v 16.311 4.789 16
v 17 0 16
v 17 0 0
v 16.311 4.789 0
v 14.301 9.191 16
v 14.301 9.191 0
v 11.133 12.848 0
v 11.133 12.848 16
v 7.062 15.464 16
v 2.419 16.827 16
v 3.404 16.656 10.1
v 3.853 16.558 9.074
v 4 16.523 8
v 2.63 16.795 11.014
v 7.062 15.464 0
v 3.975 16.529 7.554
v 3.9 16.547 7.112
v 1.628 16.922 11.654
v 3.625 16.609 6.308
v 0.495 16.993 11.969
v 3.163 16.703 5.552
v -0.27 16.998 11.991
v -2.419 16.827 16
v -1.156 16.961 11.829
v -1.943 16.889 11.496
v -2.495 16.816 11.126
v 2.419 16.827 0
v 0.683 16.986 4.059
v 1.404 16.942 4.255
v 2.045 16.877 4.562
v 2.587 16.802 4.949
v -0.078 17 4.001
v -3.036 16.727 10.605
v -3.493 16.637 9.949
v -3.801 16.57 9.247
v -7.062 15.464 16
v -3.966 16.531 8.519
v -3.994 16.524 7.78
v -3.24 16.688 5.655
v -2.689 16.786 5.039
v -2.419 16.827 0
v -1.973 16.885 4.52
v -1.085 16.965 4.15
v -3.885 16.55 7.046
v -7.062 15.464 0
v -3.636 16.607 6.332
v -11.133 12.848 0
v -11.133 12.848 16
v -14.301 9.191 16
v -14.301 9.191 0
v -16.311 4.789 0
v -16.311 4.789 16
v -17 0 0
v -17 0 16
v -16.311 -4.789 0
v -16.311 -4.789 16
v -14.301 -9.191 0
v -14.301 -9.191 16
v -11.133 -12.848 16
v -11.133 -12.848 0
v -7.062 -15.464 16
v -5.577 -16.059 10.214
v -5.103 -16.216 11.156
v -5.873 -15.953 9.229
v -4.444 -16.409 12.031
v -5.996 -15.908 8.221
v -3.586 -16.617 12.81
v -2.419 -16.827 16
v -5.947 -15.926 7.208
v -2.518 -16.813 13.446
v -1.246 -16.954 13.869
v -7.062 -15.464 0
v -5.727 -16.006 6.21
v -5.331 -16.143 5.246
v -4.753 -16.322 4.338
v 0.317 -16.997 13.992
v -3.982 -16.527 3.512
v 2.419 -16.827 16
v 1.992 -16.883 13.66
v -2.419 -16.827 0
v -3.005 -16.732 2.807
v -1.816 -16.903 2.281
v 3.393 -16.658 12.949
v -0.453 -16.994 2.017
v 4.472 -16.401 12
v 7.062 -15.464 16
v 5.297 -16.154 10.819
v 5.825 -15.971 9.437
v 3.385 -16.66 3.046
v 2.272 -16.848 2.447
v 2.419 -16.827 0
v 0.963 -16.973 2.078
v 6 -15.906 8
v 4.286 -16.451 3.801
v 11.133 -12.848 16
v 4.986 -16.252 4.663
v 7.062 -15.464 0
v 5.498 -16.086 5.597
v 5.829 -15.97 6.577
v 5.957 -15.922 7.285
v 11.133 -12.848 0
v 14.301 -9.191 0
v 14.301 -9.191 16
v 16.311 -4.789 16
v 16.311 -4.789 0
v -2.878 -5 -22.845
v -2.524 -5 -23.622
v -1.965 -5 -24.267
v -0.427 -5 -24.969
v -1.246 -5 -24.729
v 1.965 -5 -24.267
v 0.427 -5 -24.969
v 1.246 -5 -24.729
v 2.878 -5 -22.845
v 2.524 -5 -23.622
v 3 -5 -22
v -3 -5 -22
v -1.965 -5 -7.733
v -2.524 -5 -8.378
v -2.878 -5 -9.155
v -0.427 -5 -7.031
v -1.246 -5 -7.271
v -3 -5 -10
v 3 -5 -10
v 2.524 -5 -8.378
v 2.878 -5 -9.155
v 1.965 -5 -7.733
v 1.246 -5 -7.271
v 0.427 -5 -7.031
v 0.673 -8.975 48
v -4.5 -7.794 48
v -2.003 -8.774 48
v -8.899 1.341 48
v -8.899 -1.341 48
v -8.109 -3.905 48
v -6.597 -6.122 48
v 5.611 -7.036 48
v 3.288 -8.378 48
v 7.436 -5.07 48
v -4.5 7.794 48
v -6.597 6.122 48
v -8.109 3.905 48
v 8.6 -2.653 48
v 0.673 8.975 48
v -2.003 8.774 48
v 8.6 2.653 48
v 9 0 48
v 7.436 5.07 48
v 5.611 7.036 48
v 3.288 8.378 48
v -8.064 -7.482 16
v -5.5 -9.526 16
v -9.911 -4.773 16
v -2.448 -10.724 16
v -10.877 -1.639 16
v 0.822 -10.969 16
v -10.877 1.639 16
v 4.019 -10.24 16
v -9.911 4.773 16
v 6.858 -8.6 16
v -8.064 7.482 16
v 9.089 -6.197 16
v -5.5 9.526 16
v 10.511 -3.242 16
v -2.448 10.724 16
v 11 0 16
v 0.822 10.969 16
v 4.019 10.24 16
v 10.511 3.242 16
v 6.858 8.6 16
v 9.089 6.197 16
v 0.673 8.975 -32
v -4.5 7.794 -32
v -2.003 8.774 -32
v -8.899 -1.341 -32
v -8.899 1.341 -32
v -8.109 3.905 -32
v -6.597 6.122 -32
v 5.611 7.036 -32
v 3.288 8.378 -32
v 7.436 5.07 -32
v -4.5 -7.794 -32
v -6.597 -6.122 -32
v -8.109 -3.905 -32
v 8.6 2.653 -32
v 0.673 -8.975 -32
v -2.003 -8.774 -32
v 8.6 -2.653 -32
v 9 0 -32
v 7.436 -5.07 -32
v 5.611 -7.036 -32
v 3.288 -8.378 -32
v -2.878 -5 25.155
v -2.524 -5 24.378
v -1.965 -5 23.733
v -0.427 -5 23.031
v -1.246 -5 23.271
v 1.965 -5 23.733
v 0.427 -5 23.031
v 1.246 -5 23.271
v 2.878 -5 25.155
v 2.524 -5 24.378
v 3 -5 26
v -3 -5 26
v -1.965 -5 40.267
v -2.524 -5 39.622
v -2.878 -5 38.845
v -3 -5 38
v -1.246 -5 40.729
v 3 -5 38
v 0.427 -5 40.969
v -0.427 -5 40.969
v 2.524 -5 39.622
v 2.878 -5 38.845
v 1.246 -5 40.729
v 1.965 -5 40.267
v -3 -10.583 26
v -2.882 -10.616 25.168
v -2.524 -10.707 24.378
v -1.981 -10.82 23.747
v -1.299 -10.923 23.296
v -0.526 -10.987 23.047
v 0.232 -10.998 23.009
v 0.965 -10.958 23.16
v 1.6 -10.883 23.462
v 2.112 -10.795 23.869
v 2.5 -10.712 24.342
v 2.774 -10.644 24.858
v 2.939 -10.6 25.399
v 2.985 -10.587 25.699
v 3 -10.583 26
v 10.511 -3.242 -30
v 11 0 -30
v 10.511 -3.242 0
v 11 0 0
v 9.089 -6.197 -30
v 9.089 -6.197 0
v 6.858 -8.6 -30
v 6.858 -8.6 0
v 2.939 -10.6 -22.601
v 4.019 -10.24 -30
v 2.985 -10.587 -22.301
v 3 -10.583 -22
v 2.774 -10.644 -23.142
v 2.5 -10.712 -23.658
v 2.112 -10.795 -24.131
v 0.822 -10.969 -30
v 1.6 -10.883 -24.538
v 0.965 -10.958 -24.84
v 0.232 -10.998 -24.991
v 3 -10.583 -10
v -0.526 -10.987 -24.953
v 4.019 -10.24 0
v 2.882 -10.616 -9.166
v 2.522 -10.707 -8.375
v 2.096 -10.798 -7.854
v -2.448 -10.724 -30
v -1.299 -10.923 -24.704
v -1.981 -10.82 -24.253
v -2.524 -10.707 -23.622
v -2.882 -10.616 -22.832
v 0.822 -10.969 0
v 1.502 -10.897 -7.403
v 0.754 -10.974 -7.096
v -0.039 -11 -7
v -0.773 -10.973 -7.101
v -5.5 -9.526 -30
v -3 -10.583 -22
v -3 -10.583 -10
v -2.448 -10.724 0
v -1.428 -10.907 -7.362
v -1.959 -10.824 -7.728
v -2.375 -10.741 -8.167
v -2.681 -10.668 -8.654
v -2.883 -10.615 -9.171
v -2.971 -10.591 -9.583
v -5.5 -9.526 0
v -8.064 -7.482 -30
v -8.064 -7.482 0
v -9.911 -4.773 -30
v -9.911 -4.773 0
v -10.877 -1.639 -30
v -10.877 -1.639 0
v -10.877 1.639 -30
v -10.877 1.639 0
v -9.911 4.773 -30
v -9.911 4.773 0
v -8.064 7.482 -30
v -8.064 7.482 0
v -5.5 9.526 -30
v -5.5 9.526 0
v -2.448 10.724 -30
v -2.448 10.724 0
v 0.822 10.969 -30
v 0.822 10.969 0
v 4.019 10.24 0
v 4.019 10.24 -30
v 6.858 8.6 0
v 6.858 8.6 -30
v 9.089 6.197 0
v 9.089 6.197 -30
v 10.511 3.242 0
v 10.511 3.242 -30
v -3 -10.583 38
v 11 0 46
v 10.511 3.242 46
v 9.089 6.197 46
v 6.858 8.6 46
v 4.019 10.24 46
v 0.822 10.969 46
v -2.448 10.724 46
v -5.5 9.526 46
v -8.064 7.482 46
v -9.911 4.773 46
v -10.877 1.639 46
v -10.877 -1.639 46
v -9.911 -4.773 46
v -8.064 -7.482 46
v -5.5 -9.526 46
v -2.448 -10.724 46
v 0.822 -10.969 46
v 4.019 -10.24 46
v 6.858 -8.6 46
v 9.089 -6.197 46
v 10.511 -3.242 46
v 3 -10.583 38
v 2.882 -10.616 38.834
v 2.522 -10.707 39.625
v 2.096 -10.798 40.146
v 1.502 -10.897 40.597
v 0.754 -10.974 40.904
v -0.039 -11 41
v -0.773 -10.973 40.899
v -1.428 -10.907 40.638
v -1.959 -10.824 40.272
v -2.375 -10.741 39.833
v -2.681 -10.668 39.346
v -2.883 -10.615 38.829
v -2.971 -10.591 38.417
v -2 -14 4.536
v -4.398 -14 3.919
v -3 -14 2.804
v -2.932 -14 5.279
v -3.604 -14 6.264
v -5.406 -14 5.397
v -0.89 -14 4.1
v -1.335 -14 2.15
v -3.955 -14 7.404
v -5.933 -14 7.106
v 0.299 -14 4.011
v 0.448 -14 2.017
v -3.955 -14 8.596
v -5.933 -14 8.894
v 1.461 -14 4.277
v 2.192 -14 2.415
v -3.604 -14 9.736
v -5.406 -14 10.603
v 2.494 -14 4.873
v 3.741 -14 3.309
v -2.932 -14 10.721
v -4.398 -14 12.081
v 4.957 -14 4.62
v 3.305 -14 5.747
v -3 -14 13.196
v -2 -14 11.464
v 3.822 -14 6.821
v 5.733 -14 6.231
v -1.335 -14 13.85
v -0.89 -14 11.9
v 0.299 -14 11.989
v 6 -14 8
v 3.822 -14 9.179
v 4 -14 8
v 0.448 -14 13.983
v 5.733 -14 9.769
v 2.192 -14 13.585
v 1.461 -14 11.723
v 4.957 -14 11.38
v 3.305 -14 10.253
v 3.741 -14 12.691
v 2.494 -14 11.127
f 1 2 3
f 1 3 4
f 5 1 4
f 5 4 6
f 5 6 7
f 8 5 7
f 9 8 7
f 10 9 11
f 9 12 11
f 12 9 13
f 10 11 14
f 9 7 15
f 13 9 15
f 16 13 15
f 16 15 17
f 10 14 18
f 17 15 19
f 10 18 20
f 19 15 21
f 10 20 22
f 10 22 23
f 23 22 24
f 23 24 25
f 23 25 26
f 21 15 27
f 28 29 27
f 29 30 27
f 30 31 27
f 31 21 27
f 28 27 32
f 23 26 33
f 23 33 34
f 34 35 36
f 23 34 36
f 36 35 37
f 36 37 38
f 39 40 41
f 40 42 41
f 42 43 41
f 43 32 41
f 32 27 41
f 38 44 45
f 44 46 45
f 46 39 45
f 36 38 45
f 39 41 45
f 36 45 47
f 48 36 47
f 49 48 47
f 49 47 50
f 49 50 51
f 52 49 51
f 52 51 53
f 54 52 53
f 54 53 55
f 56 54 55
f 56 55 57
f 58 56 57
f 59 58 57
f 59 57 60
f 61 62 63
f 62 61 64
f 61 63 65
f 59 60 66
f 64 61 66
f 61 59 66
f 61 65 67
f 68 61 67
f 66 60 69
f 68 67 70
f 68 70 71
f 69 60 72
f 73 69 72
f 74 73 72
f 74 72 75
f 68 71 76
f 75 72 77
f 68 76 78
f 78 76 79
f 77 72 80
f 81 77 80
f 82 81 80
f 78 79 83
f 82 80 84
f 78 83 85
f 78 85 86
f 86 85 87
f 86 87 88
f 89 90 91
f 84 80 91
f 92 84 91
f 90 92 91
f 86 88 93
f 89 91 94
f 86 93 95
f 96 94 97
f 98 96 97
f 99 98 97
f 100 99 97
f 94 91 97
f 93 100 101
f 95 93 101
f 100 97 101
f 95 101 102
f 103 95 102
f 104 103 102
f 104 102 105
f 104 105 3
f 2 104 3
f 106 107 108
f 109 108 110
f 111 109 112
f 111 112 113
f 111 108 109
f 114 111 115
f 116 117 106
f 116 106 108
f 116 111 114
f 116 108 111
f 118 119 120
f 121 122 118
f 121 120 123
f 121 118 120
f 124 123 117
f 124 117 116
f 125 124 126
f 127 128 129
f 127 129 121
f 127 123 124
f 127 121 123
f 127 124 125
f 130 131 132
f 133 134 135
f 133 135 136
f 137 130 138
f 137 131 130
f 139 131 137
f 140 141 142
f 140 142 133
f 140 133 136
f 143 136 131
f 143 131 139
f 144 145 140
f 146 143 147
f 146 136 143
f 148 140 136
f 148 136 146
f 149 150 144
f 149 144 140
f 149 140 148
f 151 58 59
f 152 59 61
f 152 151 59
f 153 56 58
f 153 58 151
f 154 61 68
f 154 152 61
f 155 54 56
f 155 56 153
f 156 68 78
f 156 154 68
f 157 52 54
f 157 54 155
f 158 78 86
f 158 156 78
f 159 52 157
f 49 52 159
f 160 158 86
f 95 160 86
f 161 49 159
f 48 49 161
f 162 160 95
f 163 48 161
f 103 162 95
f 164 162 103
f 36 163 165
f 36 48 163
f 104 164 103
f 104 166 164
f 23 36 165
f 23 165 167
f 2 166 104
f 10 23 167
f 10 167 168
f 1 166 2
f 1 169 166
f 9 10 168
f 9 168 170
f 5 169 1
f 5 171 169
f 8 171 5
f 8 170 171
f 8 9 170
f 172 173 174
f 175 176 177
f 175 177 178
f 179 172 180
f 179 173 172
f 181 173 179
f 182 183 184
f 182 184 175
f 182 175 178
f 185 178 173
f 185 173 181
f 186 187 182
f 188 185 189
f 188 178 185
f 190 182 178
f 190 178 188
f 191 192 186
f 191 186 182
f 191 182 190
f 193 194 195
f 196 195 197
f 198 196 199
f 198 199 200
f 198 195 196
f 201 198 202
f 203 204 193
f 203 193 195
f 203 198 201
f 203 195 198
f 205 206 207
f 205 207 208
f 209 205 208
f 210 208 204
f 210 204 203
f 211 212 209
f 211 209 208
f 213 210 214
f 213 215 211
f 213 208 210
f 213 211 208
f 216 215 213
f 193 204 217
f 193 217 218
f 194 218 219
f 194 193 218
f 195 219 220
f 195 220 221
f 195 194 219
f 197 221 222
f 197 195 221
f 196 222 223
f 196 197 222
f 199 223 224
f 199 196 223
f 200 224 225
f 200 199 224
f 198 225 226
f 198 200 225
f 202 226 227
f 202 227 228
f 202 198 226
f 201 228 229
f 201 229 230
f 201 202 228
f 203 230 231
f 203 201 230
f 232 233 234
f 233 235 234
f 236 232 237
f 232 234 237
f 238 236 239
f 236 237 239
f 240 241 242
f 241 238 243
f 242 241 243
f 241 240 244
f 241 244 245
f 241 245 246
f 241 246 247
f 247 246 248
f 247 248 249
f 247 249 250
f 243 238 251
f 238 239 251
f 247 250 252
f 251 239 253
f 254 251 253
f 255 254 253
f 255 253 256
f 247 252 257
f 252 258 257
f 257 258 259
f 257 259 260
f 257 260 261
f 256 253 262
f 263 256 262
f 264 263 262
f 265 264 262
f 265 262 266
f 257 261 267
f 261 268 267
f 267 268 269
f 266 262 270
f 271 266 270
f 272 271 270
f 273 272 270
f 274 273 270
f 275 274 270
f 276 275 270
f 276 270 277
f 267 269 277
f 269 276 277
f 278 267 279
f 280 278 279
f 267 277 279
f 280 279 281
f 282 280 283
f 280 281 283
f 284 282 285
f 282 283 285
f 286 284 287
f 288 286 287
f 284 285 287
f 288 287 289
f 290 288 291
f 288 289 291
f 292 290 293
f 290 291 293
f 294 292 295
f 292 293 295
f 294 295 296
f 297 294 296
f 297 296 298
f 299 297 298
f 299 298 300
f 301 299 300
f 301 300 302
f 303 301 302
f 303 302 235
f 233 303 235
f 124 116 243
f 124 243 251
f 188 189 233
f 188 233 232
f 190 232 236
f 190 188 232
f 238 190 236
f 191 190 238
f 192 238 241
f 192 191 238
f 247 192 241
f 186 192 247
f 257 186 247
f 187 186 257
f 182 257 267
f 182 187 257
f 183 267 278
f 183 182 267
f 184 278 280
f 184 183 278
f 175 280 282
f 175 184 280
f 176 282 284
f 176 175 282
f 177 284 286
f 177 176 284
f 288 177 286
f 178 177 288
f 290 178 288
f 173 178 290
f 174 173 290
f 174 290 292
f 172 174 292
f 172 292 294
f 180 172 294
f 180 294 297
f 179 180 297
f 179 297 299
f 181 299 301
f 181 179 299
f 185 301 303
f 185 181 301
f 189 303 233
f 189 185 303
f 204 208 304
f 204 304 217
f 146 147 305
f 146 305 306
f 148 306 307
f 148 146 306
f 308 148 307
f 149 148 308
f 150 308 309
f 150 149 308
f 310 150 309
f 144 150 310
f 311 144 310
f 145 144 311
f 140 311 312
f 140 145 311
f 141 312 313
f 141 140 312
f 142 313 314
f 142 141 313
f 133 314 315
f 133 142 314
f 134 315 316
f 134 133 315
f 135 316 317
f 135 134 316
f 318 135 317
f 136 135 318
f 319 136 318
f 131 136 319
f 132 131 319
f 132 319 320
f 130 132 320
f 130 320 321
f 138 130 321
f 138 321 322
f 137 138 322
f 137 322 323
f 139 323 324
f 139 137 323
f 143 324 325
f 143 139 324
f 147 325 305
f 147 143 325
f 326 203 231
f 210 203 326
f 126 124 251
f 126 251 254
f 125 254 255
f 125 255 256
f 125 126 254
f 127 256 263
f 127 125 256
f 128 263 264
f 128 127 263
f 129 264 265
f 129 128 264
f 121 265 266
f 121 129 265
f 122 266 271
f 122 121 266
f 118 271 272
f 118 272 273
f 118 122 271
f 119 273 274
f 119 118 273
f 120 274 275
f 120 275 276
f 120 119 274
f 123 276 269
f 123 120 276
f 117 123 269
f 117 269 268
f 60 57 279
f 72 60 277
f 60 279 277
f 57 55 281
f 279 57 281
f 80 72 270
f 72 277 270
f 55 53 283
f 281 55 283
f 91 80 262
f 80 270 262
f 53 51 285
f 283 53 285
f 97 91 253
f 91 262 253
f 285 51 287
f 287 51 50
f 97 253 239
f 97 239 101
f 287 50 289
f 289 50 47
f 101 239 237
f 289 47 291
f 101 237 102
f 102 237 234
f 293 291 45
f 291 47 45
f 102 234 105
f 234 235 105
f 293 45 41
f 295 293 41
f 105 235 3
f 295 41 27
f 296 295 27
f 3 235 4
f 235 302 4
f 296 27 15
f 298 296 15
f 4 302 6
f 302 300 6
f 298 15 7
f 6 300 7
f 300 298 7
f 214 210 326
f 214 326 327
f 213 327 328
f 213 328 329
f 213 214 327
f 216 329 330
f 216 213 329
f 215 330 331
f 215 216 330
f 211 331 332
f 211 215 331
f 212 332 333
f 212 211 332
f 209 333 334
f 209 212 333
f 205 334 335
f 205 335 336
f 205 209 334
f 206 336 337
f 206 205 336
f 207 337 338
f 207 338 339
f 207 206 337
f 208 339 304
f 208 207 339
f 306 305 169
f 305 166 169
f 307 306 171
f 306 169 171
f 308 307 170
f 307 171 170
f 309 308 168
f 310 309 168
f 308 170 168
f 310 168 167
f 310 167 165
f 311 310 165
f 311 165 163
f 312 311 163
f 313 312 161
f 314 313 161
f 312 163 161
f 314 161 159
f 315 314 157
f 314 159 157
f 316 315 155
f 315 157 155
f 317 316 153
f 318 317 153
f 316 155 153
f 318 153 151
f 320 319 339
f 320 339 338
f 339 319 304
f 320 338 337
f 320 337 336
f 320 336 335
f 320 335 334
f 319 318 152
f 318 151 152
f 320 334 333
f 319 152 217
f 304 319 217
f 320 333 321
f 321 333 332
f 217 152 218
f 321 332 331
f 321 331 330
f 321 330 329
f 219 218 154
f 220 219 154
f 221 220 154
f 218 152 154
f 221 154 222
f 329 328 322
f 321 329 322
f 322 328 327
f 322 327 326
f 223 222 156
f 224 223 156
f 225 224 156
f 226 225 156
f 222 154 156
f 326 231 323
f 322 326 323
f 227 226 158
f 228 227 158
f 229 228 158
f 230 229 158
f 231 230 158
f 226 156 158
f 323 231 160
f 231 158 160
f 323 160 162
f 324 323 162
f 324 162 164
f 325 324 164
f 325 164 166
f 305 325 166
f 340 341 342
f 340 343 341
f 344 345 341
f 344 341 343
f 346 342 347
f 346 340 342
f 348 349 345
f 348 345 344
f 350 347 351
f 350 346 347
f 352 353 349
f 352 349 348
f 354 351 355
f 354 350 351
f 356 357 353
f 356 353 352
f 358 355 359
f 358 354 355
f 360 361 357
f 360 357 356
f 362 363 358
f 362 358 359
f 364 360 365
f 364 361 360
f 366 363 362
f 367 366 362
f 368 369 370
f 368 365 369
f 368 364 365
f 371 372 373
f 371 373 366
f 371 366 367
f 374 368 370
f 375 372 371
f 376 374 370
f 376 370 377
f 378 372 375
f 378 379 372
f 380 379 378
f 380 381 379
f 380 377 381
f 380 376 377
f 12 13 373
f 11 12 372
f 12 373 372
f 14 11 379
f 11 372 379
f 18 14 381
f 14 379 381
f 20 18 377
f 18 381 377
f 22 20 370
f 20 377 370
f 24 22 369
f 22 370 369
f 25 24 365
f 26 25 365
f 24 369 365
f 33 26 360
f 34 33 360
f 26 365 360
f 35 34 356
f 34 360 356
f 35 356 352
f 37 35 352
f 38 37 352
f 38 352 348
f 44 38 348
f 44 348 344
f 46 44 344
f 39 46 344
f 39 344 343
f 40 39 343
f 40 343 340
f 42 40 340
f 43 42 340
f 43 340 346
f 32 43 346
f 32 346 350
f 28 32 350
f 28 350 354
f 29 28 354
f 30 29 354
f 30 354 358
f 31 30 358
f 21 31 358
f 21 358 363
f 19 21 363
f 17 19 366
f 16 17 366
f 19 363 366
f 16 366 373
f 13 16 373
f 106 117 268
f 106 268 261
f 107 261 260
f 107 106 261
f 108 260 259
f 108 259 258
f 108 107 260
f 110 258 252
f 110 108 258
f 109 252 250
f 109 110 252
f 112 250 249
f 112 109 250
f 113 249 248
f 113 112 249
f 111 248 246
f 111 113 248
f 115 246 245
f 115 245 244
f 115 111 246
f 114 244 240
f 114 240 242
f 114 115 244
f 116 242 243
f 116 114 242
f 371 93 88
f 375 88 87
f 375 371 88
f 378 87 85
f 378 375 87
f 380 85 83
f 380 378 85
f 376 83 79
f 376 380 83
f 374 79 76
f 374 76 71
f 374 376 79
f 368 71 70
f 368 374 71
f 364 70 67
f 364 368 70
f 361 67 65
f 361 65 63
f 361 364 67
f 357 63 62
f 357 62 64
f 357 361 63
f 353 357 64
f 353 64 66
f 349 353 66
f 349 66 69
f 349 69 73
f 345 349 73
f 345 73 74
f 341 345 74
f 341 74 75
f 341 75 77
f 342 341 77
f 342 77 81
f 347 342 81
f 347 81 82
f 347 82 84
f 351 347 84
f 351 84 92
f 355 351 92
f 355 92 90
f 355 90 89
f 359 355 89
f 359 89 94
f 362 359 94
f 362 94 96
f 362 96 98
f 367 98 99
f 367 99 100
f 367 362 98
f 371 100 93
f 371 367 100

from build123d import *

# Parameters (mm, degrees)
F0_R      = 17
F1_DEPTH  = 16
F2_R      = 11
F3_DEPTH  = 32
F4_SIZE   = 2
F5_R      = 11
F6_DEPTH  = 32
F7_SIZE   = 2
F9_R      = 6
F10_DEPTH = 3.001
F11_R     = 4
F12_DEPTH = 31.001
F15_DEPTH = 12.001
F17_DEPTH = 12.001


with BuildPart() as f1:
    # F0 (on Top) → F1 (new body)
    with BuildSketch(Plane.XY):
        Circle(F0_R)
    extrude(amount=F1_DEPTH)

    # F2 (on face) → F3 (join)
    with BuildSketch(Plane(origin=(0, 0, 0), x_dir=(1, 0, 0), z_dir=(0, 0, -1))):
        Circle(F2_R)
    extrude(amount=F3_DEPTH)

    # F4
    f4_edges = [f1.edges().sort_by_distance(p)[0] for p in [
        (-11, 0, -32),
    ]]
    chamfer(f4_edges, length=F4_SIZE)

    # F5 (on face) → F6 (join)
    with BuildSketch(Plane.XY.offset(16)):
        Circle(F5_R)
    extrude(amount=F6_DEPTH)

    # F7
    f7_edges = [f1.edges().sort_by_distance(p)[0] for p in [
        (-11, 0, 48),
    ]]
    chamfer(f7_edges, length=F7_SIZE)

    # F9 (on offset) → F10 (cut, through all)
    with BuildSketch(Plane.XZ.offset(14)):
        with Locations((0, 8)):
            Circle(F9_R)
    extrude(amount=F10_DEPTH, mode=Mode.SUBTRACT)

    # F11 (on face) → F12 (cut, through all)
    with BuildSketch(Plane.XZ.offset(14)):
        with Locations((0, 8)):
            Circle(F11_R)
    extrude(amount=-F12_DEPTH, mode=Mode.SUBTRACT)

    # F14 (on offset) → F15 (cut, through all)
    with BuildSketch(Plane.XZ.offset(5)):
        with BuildLine():
            ThreePointArc((-3, 26), (0, 23), (3, 26))
            Line((3, 26), (3, 38))
            ThreePointArc((3, 38), (0, 41), (-3, 38))
            Line((-3, 38), (-3, 26))
        make_face()
    extrude(amount=F15_DEPTH, mode=Mode.SUBTRACT)

    # F16 (on offset) → F17 (cut, through all)
    with BuildSketch(Plane.XZ.offset(5)):
        with BuildLine():
            Line((3, -22), (3, -10))
            ThreePointArc((3, -10), (0, -7), (-3, -10))
            Line((-3, -10), (-3, -22))
            ThreePointArc((-3, -22), (0, -25), (3, -22))
        make_face()
    extrude(amount=F17_DEPTH, mode=Mode.SUBTRACT)


solid = f1.part
